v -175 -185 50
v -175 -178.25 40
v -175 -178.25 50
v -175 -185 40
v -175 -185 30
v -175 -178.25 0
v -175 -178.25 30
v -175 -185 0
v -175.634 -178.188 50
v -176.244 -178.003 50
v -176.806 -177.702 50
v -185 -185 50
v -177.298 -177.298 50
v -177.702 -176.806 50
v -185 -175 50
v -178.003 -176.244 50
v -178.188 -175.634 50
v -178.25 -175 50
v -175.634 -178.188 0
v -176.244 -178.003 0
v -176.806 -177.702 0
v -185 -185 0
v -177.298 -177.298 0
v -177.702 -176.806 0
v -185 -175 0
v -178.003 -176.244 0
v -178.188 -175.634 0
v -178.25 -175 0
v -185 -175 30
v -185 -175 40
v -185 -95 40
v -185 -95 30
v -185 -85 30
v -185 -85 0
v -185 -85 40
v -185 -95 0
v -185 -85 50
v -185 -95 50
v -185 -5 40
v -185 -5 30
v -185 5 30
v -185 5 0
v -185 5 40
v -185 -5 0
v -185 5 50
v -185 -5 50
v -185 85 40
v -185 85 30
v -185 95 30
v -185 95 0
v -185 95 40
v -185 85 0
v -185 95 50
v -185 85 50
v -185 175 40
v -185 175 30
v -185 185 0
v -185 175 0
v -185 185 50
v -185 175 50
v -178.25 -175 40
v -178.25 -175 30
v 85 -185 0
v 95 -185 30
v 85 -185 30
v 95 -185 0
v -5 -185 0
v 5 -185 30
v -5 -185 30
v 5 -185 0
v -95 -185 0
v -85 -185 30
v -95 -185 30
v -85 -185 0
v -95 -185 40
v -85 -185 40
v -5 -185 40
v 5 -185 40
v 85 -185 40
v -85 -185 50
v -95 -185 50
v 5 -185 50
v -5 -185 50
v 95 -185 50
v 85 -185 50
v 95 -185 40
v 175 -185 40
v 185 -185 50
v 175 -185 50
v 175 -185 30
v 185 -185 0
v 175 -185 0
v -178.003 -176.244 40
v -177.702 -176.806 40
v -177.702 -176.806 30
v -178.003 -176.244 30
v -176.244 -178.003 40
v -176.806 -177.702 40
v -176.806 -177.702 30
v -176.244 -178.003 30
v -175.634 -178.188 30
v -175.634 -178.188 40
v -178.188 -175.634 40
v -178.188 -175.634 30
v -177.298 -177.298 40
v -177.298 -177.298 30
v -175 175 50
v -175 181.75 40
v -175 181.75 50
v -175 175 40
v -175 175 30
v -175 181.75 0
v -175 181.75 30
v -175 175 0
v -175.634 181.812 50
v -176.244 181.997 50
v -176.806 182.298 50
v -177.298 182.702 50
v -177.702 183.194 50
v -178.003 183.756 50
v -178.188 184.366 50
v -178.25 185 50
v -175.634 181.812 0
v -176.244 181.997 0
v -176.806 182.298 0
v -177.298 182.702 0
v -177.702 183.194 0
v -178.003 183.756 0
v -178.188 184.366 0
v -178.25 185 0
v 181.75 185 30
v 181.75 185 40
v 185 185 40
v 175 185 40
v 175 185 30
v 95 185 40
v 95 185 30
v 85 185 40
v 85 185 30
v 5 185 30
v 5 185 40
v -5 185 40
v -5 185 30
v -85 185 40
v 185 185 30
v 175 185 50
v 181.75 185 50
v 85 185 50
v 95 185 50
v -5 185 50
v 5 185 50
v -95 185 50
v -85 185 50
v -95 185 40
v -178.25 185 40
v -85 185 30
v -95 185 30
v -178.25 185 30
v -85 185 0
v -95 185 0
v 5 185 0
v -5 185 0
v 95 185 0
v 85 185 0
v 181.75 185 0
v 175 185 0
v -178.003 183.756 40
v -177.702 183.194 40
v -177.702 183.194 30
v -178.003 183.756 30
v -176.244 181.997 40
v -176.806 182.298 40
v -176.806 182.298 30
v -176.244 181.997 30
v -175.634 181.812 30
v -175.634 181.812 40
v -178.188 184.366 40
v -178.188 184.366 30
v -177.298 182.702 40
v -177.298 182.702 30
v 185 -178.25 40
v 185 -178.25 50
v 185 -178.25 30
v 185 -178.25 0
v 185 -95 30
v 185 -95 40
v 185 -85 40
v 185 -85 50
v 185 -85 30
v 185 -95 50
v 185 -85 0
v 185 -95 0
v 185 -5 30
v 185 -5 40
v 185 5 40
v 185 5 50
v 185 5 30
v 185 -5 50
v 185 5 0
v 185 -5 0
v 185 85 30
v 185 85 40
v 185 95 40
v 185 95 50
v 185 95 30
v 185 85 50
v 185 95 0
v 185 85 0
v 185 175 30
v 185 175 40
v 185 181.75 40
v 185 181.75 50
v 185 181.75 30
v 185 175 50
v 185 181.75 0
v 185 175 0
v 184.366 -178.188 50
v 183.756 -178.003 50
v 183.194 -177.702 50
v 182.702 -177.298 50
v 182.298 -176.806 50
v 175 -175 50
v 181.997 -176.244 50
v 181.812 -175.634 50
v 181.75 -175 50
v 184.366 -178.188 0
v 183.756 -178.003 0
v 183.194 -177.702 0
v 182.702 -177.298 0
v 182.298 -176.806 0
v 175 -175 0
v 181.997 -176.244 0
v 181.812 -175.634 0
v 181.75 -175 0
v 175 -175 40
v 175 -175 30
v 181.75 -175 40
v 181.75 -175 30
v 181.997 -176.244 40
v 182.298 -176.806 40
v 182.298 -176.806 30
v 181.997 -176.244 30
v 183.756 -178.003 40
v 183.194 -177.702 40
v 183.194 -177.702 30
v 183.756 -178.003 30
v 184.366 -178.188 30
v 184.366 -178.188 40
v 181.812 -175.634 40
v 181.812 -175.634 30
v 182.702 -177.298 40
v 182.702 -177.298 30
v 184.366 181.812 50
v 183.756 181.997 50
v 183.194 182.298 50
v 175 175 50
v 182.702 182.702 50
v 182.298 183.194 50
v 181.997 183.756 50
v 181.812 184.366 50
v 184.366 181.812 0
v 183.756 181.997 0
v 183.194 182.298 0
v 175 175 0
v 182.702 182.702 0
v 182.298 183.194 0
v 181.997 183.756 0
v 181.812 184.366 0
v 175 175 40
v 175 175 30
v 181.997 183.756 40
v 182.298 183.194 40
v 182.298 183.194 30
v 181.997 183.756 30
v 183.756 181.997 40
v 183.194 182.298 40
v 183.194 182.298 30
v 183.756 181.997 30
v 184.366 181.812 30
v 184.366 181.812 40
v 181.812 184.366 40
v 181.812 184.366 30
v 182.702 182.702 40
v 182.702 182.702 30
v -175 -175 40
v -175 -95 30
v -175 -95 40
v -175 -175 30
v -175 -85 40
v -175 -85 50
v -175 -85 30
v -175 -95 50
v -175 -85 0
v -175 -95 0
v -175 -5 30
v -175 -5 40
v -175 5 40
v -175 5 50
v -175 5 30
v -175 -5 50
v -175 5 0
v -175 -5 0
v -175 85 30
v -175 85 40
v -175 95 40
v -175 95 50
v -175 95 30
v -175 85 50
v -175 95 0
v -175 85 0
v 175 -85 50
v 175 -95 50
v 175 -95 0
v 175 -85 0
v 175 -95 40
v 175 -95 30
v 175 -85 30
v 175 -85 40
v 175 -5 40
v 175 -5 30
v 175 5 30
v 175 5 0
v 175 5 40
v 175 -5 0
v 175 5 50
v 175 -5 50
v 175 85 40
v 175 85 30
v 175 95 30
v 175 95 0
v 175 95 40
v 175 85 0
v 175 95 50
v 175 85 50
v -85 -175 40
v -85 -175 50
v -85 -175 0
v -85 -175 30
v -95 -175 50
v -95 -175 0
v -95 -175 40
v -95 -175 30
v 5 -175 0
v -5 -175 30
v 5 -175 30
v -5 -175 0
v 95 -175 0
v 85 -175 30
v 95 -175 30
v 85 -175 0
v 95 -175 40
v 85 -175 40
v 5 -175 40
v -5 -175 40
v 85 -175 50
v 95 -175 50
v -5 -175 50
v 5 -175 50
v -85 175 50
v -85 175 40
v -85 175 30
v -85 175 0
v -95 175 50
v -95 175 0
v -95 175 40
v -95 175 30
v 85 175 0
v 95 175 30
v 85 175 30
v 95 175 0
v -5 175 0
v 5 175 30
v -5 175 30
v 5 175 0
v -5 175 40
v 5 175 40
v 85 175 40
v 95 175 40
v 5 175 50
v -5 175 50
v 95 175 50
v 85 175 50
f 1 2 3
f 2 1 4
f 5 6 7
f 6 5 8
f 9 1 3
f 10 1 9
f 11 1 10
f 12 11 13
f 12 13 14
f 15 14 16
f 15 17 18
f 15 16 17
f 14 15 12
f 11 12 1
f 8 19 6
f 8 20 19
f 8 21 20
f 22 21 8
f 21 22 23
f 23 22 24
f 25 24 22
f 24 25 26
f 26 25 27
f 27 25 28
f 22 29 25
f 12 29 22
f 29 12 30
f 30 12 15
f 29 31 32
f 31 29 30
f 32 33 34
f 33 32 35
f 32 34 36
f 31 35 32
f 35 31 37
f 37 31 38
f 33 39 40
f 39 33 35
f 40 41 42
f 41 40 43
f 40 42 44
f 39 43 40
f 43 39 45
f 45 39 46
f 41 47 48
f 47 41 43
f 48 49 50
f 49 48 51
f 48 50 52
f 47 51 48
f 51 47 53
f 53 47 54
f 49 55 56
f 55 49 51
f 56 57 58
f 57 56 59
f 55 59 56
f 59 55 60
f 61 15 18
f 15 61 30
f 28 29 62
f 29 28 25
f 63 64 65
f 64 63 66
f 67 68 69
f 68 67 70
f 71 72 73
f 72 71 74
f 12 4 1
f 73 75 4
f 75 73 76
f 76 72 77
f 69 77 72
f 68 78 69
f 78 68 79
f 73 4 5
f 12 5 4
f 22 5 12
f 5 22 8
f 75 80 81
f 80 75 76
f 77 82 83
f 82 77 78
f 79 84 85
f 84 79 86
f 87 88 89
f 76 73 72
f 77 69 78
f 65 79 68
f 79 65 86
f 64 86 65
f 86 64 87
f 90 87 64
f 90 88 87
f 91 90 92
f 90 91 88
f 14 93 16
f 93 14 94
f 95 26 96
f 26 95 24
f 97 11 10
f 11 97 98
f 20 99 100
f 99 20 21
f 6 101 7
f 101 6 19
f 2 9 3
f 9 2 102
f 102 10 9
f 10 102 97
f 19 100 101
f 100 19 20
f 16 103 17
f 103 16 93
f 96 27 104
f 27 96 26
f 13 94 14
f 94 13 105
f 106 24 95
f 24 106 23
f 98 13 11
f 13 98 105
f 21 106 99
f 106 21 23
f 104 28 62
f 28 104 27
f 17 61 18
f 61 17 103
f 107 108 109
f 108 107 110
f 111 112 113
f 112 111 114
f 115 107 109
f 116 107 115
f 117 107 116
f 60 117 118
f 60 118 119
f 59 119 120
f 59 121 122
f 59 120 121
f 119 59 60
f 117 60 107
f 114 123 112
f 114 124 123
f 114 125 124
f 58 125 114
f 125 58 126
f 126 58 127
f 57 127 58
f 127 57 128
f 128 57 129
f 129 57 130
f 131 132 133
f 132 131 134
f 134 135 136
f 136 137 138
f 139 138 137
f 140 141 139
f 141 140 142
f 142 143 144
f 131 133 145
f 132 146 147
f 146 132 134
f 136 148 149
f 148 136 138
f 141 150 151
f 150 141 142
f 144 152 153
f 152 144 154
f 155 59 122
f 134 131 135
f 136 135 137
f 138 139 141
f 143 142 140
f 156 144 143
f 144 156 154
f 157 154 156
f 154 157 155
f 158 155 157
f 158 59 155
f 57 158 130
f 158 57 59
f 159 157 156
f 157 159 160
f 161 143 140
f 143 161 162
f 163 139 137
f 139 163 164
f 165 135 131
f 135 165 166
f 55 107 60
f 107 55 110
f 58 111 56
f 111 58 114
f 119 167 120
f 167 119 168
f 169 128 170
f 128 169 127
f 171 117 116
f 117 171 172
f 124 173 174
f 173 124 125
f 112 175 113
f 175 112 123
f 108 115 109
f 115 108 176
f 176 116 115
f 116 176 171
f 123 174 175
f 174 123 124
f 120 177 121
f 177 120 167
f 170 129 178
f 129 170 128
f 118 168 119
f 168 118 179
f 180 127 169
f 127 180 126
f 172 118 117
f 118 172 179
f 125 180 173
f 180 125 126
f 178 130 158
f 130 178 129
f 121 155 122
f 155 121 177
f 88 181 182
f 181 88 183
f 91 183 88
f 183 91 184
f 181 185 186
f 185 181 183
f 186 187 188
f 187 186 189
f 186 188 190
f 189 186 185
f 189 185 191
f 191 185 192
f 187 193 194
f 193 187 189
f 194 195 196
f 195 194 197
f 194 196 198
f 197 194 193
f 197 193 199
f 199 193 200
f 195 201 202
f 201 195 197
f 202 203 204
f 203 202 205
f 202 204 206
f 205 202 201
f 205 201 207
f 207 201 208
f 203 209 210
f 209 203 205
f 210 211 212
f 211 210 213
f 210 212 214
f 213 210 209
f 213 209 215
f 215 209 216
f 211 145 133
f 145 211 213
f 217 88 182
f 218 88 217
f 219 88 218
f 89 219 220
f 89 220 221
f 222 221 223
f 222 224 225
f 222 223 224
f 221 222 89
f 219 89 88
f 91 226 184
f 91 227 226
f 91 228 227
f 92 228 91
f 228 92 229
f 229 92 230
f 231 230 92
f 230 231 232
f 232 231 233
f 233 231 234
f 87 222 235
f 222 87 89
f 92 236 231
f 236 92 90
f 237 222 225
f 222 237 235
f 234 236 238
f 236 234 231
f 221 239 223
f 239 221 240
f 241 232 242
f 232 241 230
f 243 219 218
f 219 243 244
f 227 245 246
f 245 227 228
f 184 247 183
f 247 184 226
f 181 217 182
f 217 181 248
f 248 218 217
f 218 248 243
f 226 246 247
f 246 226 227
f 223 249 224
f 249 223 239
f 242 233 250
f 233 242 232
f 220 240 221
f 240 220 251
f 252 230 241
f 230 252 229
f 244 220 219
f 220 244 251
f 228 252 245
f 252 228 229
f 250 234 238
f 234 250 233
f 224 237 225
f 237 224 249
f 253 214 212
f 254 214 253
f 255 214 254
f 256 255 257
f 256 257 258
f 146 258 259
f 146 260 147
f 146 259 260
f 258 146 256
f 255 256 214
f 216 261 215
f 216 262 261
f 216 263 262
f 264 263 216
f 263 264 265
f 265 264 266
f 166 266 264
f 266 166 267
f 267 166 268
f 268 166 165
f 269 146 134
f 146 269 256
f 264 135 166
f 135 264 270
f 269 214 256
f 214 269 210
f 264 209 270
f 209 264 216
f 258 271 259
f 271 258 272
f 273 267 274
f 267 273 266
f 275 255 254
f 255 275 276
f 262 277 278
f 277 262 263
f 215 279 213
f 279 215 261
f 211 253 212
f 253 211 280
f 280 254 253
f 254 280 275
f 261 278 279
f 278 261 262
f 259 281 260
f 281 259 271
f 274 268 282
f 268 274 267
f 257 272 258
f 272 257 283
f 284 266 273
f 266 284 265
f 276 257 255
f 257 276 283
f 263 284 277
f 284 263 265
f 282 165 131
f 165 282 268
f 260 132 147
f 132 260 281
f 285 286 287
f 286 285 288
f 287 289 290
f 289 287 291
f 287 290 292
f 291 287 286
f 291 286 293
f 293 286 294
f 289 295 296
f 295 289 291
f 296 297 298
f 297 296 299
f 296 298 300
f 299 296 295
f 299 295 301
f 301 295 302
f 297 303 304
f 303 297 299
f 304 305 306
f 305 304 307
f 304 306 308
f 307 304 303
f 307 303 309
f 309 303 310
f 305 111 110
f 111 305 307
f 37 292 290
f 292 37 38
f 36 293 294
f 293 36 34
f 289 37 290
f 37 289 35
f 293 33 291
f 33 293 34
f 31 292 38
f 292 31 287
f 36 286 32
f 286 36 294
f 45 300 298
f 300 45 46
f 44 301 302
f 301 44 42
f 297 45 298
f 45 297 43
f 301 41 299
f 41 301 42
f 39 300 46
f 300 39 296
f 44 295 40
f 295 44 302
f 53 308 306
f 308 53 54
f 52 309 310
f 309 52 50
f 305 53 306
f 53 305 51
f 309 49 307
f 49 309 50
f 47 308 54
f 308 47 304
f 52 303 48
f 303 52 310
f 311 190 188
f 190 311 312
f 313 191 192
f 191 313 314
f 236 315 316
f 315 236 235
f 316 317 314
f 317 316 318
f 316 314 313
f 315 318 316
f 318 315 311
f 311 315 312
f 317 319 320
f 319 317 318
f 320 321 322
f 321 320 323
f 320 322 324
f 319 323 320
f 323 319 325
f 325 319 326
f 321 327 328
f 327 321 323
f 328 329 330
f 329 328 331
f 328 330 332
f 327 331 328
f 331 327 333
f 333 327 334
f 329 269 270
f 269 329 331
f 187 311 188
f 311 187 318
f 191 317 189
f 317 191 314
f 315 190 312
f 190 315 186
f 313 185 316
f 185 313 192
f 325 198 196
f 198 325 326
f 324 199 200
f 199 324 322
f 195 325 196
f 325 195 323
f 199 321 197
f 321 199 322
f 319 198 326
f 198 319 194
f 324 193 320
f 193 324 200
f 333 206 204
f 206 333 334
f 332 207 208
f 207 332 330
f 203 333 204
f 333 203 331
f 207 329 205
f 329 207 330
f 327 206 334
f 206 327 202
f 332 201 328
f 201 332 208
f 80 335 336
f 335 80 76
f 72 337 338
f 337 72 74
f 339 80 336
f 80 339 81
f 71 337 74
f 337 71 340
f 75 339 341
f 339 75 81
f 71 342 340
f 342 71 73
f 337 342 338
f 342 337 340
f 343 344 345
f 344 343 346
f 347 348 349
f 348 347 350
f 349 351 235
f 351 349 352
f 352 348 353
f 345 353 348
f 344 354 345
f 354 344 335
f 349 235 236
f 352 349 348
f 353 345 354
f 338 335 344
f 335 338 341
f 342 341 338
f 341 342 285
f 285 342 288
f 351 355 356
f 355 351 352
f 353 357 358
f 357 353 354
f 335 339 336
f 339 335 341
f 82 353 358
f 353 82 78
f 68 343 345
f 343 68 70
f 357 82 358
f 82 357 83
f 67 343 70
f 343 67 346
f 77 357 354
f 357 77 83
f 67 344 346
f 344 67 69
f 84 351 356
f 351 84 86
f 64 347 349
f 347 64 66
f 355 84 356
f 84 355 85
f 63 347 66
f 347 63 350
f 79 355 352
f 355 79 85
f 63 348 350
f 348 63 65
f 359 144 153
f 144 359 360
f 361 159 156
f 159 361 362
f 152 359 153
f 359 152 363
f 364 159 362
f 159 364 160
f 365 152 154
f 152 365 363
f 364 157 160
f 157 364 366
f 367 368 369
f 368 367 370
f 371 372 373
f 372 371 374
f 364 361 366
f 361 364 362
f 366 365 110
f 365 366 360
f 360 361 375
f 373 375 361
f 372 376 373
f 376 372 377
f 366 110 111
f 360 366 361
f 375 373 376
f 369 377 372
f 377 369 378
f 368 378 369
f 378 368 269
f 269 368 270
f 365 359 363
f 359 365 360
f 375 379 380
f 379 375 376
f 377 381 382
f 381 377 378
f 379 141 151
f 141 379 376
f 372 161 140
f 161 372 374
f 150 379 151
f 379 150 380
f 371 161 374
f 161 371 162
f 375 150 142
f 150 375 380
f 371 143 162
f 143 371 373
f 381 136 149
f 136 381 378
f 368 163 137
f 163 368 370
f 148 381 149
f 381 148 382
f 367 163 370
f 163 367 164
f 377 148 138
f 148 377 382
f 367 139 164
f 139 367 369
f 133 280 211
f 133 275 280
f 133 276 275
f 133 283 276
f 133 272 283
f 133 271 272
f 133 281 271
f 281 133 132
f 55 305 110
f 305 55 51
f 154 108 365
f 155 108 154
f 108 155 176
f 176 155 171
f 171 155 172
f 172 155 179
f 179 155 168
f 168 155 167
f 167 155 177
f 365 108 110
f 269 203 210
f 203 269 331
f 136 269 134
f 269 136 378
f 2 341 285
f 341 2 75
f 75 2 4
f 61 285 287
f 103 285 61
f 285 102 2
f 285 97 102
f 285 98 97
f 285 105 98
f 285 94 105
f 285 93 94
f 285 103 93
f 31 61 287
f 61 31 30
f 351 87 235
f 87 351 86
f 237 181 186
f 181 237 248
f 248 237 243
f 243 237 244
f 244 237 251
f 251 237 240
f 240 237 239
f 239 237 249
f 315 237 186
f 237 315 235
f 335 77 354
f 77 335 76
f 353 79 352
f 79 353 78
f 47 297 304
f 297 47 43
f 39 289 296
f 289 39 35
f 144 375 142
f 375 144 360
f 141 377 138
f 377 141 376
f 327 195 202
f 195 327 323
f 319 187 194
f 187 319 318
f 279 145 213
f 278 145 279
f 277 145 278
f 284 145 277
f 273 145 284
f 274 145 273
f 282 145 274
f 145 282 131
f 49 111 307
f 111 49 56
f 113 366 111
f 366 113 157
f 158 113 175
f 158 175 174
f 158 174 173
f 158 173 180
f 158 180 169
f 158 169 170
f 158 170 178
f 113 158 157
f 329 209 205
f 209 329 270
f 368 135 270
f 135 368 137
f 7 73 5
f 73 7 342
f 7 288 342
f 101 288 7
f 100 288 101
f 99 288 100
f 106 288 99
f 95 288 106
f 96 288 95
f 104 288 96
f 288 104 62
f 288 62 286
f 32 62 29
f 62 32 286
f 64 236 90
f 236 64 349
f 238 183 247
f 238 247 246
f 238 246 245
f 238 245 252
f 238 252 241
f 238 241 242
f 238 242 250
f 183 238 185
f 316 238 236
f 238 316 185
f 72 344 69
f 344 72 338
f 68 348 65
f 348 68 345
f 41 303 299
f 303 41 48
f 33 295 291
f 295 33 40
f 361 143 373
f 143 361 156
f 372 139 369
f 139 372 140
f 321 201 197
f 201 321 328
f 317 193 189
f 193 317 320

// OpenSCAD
positions = [[-180,-180],[-180,-90],[-180,0],[-180,90],[-180,180],[180,-180],[180,-90],[180,0],[180,90],[180,180],[-90,-180],[0,-180],[90,-180],[-90,180],[0,180],[90,180]];
module vert(px,py){
translate([px,py,25])
difference(){
cube([10,10,50],center=true);
if (abs(px)==180 && abs(py)==180){
translate([5,5,0]) cylinder(r=3.25,h=55,$fn=32,center=true);
}
}
}
module hleft(zh){translate([-180,0,zh]) cube([10,370,10],center=true);}
module hright(zh){translate([180,0,zh]) cube([10,370,10],center=true);}
module hfront(zh){translate([0,-180,zh]) cube([370,10,10],center=true);}
module hback(zh){translate([0,180,zh]) cube([370,10,10],center=true);}
for(p=positions){
vert(p[0],p[1]);
}
hleft(35);
hright(35);
hfront(35);
hback(35);
